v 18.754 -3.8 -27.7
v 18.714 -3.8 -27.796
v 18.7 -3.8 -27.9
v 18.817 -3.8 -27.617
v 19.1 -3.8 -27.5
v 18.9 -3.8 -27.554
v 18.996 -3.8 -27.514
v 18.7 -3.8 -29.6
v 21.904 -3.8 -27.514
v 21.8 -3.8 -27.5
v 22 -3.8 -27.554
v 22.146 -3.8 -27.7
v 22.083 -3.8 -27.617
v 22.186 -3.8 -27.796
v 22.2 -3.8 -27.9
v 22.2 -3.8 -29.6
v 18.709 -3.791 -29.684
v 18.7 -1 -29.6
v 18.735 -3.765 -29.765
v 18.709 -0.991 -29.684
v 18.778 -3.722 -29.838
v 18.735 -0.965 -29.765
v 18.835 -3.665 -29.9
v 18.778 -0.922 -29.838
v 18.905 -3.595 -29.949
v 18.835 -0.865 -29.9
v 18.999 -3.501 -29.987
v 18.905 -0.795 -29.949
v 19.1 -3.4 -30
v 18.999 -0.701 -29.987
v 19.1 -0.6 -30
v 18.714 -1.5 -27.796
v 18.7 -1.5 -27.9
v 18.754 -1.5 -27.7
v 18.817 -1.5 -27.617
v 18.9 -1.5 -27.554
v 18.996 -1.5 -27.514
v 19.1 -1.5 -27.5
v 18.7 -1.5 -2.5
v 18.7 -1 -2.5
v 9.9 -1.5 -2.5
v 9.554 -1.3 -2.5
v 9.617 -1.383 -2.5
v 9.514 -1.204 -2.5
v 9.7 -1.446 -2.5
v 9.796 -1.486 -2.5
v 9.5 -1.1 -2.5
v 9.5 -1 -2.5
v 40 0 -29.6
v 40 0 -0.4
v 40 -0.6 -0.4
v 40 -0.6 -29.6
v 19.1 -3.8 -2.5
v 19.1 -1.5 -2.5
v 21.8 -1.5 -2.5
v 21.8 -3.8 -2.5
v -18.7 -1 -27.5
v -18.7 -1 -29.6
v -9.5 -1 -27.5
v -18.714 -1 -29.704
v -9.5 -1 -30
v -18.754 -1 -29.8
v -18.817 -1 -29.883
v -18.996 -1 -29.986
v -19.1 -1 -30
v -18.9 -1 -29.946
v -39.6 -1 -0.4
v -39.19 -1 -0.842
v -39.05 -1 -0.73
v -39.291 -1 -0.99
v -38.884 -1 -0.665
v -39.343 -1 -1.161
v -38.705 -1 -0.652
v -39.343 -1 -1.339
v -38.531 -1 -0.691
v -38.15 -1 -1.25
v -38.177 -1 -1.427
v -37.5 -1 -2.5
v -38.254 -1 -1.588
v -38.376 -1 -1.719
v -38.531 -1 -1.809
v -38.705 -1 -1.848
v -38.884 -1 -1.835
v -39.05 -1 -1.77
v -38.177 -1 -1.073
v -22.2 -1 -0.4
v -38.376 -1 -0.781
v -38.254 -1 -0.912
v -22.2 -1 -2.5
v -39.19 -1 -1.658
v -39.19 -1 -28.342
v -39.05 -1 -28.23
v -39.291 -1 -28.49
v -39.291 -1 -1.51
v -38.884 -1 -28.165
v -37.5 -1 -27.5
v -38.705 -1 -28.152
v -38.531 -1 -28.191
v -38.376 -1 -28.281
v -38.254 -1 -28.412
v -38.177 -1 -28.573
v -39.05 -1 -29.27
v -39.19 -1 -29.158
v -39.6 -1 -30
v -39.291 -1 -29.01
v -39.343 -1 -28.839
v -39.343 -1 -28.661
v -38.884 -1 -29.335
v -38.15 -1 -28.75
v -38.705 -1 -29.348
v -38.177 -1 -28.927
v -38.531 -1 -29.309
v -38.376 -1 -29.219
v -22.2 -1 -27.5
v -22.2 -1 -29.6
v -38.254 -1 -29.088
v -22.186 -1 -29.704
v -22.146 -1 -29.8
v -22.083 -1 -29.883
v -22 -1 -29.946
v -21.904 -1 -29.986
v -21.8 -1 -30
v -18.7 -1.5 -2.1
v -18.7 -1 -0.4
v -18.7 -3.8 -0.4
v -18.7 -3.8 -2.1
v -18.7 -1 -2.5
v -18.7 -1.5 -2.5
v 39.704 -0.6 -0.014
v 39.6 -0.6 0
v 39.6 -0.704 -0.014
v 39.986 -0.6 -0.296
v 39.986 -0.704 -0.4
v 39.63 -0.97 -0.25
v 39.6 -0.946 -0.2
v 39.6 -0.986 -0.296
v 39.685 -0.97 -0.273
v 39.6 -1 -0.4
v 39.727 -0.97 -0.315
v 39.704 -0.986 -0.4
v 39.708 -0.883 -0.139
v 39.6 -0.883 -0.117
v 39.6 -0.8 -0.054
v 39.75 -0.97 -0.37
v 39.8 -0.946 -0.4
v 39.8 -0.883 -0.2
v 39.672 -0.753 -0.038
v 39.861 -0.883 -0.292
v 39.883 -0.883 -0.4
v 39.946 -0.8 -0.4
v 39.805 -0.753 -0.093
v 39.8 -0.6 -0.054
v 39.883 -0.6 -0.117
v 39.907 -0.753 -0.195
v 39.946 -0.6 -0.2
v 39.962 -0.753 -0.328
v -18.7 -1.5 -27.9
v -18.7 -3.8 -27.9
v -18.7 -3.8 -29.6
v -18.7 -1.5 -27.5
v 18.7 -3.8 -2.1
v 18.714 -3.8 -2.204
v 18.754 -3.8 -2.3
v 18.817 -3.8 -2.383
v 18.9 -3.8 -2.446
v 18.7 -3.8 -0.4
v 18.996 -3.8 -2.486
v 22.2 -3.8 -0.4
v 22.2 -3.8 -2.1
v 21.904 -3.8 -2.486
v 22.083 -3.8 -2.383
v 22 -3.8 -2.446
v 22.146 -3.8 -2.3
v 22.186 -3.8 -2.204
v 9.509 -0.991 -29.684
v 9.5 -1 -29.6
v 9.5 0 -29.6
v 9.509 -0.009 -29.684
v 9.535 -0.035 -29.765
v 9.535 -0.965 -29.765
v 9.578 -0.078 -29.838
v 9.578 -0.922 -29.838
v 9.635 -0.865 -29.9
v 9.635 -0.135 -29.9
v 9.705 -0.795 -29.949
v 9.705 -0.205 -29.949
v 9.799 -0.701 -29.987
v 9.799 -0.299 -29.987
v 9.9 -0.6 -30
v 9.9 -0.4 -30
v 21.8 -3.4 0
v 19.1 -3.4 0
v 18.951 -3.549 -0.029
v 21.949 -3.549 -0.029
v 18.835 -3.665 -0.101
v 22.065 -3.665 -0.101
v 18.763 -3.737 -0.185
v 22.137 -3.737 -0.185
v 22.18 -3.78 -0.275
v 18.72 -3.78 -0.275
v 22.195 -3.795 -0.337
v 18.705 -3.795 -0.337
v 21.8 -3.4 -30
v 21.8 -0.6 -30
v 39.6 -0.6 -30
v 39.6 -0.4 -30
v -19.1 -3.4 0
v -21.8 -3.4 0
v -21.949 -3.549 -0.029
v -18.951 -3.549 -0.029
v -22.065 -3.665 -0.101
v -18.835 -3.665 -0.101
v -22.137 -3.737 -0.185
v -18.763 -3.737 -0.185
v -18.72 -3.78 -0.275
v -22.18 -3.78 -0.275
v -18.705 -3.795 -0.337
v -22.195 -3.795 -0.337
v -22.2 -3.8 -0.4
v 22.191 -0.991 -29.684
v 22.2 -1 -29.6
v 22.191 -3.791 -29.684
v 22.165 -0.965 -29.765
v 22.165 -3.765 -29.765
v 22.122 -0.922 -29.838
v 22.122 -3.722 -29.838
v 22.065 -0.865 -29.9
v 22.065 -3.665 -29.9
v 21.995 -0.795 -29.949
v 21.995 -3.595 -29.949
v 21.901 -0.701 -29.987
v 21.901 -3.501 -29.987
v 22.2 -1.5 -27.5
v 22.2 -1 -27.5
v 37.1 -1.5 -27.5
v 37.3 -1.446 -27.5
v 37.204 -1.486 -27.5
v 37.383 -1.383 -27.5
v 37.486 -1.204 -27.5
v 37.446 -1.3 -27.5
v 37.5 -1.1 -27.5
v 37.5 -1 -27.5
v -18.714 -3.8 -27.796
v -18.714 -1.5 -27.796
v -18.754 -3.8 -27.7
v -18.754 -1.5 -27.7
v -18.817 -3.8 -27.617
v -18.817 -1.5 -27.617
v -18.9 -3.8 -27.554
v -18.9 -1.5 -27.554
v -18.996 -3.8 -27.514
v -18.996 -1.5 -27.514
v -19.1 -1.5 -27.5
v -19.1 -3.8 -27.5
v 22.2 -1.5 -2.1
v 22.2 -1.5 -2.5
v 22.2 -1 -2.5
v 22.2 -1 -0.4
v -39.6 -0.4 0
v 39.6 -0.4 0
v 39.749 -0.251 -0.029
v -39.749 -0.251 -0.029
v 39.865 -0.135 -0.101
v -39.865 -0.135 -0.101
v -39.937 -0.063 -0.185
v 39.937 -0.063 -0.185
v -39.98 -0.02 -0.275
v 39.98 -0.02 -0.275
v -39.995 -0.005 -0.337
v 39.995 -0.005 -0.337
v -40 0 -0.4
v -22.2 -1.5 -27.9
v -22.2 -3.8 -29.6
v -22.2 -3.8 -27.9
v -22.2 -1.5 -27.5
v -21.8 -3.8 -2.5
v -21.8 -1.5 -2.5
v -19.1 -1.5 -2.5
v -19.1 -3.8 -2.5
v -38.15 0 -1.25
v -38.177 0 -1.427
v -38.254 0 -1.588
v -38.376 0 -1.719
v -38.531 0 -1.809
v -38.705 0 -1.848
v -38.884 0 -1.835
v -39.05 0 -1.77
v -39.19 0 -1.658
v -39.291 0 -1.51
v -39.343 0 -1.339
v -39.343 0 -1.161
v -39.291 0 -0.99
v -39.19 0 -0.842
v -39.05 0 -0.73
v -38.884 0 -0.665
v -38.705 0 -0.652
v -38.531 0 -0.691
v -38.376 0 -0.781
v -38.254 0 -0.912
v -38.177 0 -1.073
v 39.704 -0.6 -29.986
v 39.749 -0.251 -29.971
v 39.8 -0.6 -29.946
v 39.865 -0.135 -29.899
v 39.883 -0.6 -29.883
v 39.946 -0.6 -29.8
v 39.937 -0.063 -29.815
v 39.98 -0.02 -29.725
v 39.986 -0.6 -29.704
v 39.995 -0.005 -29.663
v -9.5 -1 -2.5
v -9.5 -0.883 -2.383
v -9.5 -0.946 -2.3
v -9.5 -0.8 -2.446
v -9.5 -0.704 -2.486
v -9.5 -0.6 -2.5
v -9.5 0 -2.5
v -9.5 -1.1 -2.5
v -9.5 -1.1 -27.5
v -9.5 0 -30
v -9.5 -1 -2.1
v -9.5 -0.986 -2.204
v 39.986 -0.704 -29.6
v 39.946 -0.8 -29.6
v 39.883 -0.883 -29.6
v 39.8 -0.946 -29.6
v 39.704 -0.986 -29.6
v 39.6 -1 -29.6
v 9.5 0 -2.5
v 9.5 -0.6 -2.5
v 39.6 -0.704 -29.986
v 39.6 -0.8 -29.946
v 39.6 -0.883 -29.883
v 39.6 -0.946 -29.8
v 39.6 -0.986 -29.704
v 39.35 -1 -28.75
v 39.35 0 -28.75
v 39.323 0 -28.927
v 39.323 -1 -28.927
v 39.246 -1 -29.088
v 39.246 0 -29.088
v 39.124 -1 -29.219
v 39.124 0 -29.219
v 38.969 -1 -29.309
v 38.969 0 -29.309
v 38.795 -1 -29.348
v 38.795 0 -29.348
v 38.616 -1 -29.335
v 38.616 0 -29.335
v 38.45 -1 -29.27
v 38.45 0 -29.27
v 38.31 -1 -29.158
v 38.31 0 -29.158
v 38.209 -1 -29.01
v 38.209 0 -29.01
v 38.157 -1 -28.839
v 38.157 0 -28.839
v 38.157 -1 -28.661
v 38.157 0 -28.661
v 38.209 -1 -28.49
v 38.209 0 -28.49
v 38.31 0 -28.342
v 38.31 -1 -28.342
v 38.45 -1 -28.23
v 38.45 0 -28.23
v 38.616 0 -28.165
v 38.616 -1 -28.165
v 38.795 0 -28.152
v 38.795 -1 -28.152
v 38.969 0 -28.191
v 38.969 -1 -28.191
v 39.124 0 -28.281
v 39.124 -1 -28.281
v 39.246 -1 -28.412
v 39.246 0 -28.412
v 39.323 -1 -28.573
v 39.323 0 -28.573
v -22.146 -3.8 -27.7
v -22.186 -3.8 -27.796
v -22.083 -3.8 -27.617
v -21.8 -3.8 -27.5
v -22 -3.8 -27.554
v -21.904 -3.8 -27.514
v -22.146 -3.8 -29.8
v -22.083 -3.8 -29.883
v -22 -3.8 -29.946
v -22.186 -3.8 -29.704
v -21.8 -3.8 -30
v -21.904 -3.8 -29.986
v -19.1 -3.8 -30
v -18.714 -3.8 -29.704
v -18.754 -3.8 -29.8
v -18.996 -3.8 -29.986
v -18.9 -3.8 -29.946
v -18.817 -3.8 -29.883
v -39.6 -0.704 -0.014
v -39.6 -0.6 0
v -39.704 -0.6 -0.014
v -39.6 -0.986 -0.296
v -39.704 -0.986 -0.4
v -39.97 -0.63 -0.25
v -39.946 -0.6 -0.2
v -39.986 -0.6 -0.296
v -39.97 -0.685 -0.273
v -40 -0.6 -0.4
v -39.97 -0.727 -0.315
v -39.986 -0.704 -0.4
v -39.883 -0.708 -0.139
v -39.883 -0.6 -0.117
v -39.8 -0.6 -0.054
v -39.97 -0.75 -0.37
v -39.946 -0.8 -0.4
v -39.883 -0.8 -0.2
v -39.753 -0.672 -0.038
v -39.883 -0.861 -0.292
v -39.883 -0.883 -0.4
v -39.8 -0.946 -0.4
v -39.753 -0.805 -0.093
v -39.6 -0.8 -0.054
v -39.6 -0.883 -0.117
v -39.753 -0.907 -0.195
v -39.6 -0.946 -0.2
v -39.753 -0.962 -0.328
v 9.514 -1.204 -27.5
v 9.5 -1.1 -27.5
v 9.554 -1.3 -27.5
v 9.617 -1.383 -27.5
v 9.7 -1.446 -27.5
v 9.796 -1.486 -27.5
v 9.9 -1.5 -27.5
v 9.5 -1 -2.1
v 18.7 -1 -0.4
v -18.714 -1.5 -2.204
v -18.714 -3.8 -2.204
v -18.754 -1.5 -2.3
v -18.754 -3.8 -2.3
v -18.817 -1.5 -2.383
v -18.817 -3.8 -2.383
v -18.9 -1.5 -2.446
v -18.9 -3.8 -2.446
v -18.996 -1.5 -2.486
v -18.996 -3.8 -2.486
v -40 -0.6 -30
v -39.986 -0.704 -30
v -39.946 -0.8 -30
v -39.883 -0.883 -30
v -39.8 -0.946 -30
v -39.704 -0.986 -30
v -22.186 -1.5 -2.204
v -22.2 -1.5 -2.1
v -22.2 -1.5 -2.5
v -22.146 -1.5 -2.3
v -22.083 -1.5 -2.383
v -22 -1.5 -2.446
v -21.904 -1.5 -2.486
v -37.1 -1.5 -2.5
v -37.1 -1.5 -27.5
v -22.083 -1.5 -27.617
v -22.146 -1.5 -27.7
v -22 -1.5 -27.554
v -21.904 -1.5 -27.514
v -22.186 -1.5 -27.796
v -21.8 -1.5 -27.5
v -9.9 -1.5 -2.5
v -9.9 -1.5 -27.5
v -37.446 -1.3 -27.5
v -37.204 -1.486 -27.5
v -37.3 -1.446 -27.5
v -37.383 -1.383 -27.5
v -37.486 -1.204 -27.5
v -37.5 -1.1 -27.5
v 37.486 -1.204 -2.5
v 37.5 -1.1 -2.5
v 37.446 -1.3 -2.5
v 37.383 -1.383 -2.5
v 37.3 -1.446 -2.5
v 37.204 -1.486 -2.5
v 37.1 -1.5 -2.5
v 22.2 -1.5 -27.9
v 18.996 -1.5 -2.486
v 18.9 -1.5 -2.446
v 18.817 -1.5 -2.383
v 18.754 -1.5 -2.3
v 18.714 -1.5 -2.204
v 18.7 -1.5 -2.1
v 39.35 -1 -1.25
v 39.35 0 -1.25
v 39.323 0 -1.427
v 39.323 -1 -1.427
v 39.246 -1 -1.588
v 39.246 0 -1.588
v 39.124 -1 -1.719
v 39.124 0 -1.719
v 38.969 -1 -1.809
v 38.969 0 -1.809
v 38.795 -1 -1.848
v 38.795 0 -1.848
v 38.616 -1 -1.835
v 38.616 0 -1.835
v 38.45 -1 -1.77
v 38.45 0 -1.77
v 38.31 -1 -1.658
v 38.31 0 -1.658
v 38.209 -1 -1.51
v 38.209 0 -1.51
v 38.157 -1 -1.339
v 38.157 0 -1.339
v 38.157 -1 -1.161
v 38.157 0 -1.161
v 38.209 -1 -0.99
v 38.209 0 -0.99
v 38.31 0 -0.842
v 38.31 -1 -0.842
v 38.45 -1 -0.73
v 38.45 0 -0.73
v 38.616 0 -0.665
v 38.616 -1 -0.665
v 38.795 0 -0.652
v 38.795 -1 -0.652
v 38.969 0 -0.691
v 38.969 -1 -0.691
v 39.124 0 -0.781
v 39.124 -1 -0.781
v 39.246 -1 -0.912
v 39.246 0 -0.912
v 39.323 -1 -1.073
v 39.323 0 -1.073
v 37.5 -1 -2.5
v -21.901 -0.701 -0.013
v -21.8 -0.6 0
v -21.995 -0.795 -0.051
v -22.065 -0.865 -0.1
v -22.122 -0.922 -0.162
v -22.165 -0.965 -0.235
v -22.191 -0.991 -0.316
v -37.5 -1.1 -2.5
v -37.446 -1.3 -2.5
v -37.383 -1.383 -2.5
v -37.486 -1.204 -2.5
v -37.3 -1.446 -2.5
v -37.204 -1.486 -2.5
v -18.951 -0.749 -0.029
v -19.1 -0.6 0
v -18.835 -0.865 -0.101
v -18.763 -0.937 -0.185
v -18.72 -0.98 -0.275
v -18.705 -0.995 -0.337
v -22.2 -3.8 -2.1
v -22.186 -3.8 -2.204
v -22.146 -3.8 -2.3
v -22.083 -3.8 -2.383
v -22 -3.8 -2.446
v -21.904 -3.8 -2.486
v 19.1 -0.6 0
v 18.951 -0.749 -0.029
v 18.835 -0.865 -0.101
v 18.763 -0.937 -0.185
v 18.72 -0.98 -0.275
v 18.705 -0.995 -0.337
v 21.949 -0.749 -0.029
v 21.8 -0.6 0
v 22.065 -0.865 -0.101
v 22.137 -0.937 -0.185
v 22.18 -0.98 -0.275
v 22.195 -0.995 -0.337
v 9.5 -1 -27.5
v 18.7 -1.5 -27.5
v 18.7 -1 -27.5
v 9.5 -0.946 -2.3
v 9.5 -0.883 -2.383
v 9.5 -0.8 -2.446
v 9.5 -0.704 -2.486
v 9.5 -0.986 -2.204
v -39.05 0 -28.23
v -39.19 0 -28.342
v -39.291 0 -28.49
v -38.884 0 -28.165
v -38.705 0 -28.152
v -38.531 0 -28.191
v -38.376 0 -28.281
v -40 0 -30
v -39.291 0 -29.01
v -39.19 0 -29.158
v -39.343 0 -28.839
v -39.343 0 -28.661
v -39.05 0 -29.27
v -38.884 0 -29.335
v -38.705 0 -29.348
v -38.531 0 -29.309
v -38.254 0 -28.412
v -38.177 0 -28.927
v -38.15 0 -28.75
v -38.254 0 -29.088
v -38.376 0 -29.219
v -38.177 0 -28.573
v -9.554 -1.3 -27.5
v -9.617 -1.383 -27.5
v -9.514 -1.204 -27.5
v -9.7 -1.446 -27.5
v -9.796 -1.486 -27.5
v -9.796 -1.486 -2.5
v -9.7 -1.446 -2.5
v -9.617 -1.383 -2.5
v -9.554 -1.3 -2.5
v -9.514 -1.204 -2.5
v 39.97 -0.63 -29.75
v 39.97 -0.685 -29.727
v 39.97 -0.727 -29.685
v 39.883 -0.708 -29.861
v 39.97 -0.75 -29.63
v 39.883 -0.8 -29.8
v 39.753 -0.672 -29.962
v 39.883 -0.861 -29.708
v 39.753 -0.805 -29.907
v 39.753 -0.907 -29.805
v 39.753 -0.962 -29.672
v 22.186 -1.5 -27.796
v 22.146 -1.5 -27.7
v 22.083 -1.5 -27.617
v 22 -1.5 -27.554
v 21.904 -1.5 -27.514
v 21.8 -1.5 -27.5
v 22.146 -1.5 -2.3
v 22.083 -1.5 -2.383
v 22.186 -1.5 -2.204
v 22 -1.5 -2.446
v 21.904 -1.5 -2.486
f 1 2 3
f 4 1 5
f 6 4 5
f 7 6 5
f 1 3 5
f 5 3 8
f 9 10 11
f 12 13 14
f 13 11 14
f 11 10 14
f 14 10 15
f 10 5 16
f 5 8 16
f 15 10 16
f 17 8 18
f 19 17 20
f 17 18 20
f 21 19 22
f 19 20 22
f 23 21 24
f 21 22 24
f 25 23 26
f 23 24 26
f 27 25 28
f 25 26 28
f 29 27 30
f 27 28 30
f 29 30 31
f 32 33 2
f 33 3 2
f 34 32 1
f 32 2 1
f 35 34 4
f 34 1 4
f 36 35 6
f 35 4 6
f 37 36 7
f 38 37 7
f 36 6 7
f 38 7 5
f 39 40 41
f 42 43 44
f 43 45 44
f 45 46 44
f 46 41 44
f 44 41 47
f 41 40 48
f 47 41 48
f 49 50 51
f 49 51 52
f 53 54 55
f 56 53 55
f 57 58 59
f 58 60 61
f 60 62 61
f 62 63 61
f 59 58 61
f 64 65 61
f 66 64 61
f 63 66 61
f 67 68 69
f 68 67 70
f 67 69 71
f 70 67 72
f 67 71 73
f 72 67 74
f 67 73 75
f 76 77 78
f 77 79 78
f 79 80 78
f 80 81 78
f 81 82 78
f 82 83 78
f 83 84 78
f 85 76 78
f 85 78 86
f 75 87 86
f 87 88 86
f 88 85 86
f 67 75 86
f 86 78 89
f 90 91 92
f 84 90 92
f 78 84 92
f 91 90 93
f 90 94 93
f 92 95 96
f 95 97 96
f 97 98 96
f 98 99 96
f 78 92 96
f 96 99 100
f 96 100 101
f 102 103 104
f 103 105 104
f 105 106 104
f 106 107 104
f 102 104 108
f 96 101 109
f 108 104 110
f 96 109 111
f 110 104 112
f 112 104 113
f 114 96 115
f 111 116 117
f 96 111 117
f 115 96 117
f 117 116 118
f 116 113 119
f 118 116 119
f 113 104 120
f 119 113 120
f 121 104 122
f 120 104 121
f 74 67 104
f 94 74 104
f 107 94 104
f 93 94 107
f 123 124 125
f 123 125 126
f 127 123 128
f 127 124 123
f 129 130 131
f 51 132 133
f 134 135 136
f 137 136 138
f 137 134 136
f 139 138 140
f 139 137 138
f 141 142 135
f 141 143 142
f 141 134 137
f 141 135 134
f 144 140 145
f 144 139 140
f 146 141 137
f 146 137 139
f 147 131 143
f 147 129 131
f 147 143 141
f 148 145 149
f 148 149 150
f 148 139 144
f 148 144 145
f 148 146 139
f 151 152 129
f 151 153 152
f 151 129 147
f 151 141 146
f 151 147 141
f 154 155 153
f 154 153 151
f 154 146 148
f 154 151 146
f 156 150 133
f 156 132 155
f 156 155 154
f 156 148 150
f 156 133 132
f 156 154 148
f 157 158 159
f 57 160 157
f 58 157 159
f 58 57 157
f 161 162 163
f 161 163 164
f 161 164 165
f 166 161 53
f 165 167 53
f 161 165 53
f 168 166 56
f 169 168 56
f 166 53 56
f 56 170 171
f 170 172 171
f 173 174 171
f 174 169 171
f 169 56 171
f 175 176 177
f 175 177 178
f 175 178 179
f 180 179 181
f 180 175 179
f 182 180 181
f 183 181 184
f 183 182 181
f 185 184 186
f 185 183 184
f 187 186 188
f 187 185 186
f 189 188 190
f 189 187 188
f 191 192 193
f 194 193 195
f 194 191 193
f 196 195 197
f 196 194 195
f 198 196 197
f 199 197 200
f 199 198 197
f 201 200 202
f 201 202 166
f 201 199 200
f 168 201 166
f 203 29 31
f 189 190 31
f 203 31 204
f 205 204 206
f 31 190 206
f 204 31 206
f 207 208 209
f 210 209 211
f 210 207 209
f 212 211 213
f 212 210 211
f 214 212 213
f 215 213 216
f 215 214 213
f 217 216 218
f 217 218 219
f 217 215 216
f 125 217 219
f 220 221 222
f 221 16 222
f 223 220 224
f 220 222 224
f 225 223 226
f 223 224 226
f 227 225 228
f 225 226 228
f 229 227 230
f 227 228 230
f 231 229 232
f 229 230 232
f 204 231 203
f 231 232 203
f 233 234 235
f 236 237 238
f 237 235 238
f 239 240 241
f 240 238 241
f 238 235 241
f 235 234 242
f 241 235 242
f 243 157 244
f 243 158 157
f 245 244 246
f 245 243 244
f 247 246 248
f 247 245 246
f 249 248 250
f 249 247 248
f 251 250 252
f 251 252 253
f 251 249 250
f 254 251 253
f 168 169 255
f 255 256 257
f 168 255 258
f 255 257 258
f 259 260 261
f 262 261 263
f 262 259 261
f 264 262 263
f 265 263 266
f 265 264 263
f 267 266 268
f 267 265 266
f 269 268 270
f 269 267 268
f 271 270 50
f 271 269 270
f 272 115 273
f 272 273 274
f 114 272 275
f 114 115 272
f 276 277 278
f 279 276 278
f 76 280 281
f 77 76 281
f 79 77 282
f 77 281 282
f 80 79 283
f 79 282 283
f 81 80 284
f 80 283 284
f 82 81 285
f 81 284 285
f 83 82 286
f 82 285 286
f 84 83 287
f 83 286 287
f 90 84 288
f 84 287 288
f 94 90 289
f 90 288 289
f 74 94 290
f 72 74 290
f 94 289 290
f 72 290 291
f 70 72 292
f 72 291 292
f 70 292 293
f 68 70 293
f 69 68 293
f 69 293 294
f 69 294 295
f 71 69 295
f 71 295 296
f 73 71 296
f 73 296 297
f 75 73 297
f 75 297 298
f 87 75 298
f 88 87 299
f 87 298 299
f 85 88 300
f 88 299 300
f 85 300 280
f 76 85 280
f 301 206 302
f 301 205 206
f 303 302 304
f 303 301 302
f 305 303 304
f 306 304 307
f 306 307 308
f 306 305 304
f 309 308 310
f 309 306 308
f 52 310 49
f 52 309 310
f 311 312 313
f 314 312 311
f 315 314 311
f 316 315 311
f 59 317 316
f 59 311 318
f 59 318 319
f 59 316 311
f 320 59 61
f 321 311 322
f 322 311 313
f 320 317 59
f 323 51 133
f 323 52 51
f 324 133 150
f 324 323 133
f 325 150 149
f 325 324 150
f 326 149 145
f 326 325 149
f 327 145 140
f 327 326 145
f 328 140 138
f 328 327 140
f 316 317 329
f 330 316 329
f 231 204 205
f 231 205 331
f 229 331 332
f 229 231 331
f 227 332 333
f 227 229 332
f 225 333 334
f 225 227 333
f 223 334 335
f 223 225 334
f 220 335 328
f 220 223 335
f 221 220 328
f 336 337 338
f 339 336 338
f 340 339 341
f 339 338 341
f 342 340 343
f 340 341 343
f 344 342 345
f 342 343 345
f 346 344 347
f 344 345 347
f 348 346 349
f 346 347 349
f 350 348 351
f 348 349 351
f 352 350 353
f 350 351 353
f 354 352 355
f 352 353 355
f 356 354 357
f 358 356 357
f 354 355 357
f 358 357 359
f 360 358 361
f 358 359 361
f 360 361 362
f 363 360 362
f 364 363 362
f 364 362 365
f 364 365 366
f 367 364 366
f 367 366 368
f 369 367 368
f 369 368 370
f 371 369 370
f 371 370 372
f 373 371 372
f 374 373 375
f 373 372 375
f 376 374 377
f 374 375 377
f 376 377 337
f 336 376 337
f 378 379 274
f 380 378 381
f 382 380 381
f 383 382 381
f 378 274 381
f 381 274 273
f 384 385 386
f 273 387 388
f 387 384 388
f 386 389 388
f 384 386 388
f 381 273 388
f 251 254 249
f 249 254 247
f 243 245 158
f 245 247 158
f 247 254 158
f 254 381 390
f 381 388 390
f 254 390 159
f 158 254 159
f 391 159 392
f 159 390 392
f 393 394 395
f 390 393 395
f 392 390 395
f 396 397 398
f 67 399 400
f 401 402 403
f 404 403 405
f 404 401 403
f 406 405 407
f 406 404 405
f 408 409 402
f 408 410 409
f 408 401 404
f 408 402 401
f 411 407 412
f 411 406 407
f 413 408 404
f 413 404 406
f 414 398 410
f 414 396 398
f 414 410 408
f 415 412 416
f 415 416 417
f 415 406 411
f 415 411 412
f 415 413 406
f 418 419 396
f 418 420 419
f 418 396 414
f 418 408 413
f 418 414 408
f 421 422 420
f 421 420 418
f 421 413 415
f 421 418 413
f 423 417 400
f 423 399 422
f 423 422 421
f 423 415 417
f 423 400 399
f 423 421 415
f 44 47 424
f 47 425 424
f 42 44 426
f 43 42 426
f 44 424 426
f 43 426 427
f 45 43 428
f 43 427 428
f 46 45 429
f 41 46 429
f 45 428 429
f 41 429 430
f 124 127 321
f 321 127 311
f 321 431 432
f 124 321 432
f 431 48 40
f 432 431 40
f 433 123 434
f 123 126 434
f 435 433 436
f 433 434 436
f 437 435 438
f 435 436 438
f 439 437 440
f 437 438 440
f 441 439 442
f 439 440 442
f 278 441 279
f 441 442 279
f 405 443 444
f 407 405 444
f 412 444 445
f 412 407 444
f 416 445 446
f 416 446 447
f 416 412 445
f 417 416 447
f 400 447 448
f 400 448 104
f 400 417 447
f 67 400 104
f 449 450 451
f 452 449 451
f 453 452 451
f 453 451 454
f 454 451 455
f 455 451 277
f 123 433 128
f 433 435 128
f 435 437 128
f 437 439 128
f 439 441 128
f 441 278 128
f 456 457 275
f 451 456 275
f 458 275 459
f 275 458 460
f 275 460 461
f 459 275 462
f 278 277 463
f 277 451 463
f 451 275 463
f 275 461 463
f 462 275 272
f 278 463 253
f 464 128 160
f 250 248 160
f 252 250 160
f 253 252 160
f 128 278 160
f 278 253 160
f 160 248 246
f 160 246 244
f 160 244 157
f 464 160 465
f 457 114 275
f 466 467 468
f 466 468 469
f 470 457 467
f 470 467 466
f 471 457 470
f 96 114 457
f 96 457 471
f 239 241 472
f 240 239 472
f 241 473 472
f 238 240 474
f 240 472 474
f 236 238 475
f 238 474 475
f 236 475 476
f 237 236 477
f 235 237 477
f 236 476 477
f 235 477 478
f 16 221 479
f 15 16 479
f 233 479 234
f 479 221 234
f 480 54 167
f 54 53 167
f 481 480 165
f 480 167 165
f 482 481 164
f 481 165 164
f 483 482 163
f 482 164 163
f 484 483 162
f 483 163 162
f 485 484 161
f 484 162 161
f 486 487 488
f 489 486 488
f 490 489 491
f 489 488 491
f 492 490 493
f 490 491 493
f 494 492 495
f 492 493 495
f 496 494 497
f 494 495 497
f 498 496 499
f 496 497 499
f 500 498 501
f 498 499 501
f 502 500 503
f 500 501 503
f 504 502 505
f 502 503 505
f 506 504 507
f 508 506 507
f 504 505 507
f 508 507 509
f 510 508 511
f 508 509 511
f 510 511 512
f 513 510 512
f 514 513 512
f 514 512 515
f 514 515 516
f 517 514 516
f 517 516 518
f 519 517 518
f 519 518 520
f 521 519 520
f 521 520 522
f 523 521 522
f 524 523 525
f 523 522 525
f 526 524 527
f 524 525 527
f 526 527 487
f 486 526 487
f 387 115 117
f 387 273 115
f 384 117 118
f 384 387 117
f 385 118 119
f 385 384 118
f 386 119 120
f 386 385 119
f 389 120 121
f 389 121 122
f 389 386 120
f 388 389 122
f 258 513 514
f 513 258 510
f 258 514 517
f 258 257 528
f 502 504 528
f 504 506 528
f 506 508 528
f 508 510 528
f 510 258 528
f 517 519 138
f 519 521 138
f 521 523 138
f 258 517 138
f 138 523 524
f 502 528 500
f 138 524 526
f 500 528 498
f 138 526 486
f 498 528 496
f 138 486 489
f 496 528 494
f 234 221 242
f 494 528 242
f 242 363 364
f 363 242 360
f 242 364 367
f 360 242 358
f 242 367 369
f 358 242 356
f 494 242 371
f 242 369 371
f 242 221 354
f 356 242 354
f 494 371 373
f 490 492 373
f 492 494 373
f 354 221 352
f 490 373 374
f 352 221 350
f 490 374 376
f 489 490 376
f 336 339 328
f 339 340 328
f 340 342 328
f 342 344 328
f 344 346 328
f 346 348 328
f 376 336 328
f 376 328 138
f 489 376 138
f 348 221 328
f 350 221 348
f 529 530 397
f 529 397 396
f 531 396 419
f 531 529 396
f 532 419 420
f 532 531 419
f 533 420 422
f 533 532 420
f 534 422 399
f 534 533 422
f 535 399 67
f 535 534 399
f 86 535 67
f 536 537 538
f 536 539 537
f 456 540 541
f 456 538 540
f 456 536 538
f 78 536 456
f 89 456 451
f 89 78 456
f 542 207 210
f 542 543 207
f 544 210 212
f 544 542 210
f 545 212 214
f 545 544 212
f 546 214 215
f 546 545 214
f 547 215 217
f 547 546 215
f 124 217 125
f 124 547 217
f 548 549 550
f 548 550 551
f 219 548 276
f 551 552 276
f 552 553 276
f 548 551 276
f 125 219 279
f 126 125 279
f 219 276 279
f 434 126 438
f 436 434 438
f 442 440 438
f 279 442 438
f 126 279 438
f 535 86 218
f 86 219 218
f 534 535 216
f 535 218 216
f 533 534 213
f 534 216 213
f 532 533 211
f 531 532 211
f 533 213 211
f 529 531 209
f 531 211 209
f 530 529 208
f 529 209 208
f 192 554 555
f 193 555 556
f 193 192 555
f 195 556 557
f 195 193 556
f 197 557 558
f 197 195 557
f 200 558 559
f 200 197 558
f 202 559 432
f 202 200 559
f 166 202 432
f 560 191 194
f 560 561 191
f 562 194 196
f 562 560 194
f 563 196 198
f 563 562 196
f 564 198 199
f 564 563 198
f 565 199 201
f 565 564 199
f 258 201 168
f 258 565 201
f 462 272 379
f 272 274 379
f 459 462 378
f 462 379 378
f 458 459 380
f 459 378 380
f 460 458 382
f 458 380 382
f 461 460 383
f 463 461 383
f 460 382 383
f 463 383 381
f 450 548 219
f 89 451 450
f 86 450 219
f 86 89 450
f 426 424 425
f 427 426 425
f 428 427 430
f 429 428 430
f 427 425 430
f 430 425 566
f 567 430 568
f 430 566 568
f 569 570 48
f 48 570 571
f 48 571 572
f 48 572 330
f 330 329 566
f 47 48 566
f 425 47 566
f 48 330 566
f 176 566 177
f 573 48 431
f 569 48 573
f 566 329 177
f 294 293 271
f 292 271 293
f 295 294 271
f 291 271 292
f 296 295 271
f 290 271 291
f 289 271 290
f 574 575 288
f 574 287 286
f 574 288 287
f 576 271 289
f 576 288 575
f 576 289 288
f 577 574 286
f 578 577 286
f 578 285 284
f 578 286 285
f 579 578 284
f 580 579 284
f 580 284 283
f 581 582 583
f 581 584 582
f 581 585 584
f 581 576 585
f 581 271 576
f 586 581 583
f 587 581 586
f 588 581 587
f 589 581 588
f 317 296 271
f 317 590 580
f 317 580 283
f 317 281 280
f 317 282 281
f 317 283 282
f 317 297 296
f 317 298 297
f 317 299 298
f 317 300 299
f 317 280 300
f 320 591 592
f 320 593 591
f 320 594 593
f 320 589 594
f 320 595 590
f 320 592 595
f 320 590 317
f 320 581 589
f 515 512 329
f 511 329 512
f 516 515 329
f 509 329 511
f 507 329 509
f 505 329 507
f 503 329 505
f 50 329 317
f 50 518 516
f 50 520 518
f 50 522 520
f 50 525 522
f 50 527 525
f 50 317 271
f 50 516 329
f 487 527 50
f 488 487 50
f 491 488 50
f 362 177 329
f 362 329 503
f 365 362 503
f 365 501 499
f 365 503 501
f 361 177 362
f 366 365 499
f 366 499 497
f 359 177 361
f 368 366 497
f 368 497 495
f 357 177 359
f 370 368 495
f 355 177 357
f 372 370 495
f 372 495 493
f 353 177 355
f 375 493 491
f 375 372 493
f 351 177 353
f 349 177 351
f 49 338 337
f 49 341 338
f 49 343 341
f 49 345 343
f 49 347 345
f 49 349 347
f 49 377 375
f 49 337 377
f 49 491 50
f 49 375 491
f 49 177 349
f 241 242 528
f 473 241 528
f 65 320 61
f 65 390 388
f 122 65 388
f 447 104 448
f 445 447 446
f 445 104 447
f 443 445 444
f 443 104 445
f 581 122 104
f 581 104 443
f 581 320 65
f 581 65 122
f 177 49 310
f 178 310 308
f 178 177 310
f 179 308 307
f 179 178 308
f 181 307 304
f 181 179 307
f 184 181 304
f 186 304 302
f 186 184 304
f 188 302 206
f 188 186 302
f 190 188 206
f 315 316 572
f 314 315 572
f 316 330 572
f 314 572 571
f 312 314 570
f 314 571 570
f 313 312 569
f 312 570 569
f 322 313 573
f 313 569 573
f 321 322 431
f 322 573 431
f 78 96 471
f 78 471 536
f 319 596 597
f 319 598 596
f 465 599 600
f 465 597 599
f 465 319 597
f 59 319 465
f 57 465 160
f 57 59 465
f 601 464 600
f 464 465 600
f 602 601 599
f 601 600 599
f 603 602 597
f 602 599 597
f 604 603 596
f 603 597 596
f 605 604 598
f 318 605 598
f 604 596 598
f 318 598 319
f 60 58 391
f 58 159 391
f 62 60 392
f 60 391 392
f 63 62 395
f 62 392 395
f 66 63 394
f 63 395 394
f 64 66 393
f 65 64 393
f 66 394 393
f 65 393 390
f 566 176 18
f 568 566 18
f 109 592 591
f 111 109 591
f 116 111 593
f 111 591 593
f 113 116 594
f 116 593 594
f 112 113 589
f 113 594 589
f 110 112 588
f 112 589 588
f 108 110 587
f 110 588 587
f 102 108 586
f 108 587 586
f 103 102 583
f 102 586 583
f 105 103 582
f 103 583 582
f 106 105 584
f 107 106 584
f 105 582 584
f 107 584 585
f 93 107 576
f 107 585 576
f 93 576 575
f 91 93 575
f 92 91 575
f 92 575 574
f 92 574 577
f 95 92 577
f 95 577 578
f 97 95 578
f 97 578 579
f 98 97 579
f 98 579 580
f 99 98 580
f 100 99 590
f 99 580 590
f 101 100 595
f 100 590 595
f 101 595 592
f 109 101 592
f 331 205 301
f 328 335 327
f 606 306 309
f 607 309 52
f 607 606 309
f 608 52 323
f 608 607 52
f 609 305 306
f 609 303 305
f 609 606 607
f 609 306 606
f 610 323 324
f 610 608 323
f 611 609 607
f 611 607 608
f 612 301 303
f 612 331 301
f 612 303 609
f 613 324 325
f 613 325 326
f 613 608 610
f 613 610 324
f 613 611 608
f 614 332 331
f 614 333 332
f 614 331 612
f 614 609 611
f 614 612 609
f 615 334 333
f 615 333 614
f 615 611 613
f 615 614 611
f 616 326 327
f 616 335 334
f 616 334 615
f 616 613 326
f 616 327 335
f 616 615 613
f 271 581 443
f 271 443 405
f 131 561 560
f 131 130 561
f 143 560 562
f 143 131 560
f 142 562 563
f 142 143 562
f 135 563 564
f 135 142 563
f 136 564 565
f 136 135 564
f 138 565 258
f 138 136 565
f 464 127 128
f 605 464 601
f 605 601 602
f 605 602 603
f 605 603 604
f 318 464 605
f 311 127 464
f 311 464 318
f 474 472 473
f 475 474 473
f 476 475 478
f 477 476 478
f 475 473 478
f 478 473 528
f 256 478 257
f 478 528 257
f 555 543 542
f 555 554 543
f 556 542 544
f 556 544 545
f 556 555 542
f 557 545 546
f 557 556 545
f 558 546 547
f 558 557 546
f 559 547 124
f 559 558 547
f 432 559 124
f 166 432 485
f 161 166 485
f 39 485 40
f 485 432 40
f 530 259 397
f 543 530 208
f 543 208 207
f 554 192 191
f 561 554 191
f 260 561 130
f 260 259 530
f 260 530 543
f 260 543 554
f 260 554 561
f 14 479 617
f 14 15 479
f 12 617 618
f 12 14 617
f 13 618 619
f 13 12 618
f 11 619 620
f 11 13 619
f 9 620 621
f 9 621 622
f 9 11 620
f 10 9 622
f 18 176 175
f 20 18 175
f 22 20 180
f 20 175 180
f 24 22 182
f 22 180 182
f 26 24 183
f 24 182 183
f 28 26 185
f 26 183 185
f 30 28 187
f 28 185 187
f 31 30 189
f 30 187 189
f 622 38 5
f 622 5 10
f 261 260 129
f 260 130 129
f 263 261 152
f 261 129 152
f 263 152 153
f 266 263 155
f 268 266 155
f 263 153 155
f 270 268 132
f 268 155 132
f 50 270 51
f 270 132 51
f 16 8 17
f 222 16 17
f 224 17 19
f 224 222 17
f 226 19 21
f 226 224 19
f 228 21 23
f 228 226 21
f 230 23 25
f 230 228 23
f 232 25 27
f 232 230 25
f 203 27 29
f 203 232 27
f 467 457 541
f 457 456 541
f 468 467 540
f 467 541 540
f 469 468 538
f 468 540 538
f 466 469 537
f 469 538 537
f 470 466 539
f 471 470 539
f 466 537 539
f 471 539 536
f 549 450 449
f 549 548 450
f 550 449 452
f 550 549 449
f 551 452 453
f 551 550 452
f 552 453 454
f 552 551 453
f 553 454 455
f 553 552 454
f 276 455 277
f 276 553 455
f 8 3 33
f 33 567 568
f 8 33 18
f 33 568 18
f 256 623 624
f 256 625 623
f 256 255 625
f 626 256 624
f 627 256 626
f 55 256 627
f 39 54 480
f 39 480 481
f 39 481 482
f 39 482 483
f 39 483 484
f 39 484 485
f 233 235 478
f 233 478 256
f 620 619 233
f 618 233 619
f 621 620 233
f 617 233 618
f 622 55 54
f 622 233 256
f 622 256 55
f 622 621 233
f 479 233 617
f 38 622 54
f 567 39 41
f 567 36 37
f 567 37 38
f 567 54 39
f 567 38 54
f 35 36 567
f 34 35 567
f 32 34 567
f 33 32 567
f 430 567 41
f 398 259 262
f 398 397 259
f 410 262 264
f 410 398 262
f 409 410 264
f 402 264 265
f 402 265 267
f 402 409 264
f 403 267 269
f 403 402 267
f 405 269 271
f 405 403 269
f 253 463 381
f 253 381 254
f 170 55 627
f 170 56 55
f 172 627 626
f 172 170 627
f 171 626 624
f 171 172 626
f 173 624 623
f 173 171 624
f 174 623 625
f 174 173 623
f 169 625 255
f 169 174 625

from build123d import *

# Parameters (mm, degrees)
SKETCH1_R             = 0.6
BOSS_EXTRUDE1_DEPTH   = 1
SKETCH1_W             = 37.4
SKETCH1_H             = 2.5
BOSS_EXTRUDE1_2_DEPTH = 1
BOSS_EXTRUDE1_3_DEPTH = 1
BOSS_EXTRUDE1_4_DEPTH = 1
SKETCH1_W_2           = 9.2
BOSS_EXTRUDE1_5_DEPTH = 1
BOSS_EXTRUDE2_DEPTH   = 1.5
SKETCH4_W             = 3.5
SKETCH4_H             = 2.5
BOSS_EXTRUDE3_DEPTH   = 3.8
FILLET1_R             = 0.4


with BuildPart() as part:
    # Sketch1 → Boss-Extrude1 (new body)
    with BuildSketch(Plane(origin=(0, 0, 0), x_dir=(1, 0, 0), z_dir=(0, 1, 0))):
        Polygon((-22.2, 30), (-25.229966902, 30), (-40, 30), (-40, 0), (-25.229966902, 0), (-22.2, 0), (-22.2, 2.5), (-37.5, 2.5), (-37.5, 27.5), (-22.2, 27.5), align=None)
        with Locations((-38.75, 1.25)):
            Circle(SKETCH1_R, mode=Mode.SUBTRACT)
        with Locations((-38.75, 28.75)):
            Circle(SKETCH1_R, mode=Mode.SUBTRACT)
    extrude(amount=-BOSS_EXTRUDE1_DEPTH)



with BuildPart() as body_2:
    # Sketch1 → Boss-Extrude1 2 (new body)
    with BuildSketch(Plane(origin=(0, 0, 0), x_dir=(1, 0, 0), z_dir=(0, 1, 0))):
        with Locations((0, 1.25)):
            Rectangle(SKETCH1_W, SKETCH1_H)
    extrude(amount=-BOSS_EXTRUDE1_2_DEPTH)


with BuildPart() as body_3:
    # Sketch1 → Boss-Extrude1 3 (new body)
    with BuildSketch(Plane(origin=(0, 0, 0), x_dir=(1, 0, 0), z_dir=(0, 1, 0))):
        Polygon((12, 30), (10, 30), (9.5, 30), (9.5, 27.5), (18.7, 27.5), (18.7, 30), align=None)
    extrude(amount=-BOSS_EXTRUDE1_3_DEPTH)


with BuildPart() as body_4:
    # Sketch1 → Boss-Extrude1 4 (new body)
    with BuildSketch(Plane(origin=(0, 0, 0), x_dir=(1, 0, 0), z_dir=(0, 1, 0))):
        Polygon((25.229966902, 30), (22.2, 30), (22.2, 27.5), (37.5, 27.5), (37.5, 2.5), (22.2, 2.5), (22.2, 0), (25.229966902, 0), (40, 0), (40, 30), align=None)
        with Locations((38.75, 1.25)):
            Circle(SKETCH1_R, mode=Mode.SUBTRACT)
        with Locations((38.75, 28.75)):
            Circle(SKETCH1_R, mode=Mode.SUBTRACT)
    extrude(amount=-BOSS_EXTRUDE1_4_DEPTH)


with BuildPart() as body_5:
    # Sketch1 → Boss-Extrude1 5 (new body)
    with BuildSketch(Plane(origin=(0, 0, 0), x_dir=(1, 0, 0), z_dir=(0, 1, 0))):
        with Locations((-14.1, 28.75)):
            Rectangle(SKETCH1_W_2, SKETCH1_H)
    extrude(amount=-BOSS_EXTRUDE1_5_DEPTH)


with BuildPart() as part_1:
    add(part.part)

    add(body_2.part)  # Boss-Extrude2 merges body 2

    add(body_3.part)  # Boss-Extrude2 merges body 3

    add(body_4.part)  # Boss-Extrude2 merges body 4

    add(body_5.part)  # Boss-Extrude2 merges body 5
    # Sketch3 → Boss-Extrude2 (add)
    with BuildSketch(Plane(origin=(0, 0, 0), x_dir=(1, 0, 0), z_dir=(0, 1, 0))):
        Polygon((-22.2, 27.5), (-37.5, 27.5), (-37.5, 2.5), (-22.2, 2.5), (-22.2, 0), (-18.7, 0), (-18.7, 2.5), (-9.5, 2.5), (-9.5, 27.5), (-18.7, 27.5), (-18.7, 30), (-22.2, 30), align=None)
        Polygon((9.5, 27.5), (18.7, 27.5), (18.7, 30), (22.2, 30), (22.2, 27.5), (37.5, 27.5), (37.5, 2.5), (22.2, 2.5), (22.2, 0), (18.7, 0), (18.7, 2.5), (9.5, 2.5), align=None)
    extrude(amount=-BOSS_EXTRUDE2_DEPTH)

    # Sketch4 → Boss-Extrude3 (add)
    with BuildSketch(Plane(origin=(0, 0, 0), x_dir=(1, 0, 0), z_dir=(0, 1, 0))):
        with Locations((-20.45, 28.75)):
            Rectangle(SKETCH4_W, SKETCH4_H)
        with Locations((20.45, 28.75)):
            Rectangle(SKETCH4_W, SKETCH4_H)
        with Locations((-20.45, 1.25)):
            Rectangle(SKETCH4_W, SKETCH4_H)
        with Locations((20.45, 1.25)):
            Rectangle(SKETCH4_W, SKETCH4_H)
    extrude(amount=-BOSS_EXTRUDE3_DEPTH)

    # Fillet1
    fillet1_edges = [part_1.edges().sort_by_distance(p)[0] for p in [
        (-22.2, -2.65, -27.5),
        (-18.7, -2.65, -27.5),
        (-18.7, -2.4, -30),
        (-22.2, -2.4, -30),
        (14.1, -1, -30),
        (18.7, -2.4, -30),
        (20.45, -3.8, -30),
        (22.2, -2.4, -30),
        (31.1, -1, -30),
        (40, -0.5, -30),
        (24.75, 0, -30),
        (9.5, -0.5, -30),
        (-18.7, -2.4, 0),
        (-20.45, -3.8, 0),
        (-22.2, -2.4, 0),
        (-31.1, -1, 0),
        (-40, -0.5, 0),
        (0, 0, 0),
        (40, -0.5, 0),
        (31.1, -1, 0),
        (22.2, -2.4, 0),
        (20.45, -3.8, 0),
        (18.7, -2.4, 0),
        (0, -1, 0),
        (-40, -1, -15),
        (0, -1, -2.5),
        (9.5, -1.5, -15),
        (-9.5, -1.5, -15),
        (40, -1, -15),
        (37.5, -1.5, -15),
        (-37.5, -1.5, -15),
        (-18.7, -2.65, -2.5),
        (-22.2, -2.65, -2.5),
        (18.7, -2.65, -2.5),
        (22.2, -2.65, -2.5),
        (22.2, -2.65, -27.5),
        (18.7, -2.65, -27.5),
    ]]
    fillet(fillet1_edges, radius=FILLET1_R)


solid = part_1.part
